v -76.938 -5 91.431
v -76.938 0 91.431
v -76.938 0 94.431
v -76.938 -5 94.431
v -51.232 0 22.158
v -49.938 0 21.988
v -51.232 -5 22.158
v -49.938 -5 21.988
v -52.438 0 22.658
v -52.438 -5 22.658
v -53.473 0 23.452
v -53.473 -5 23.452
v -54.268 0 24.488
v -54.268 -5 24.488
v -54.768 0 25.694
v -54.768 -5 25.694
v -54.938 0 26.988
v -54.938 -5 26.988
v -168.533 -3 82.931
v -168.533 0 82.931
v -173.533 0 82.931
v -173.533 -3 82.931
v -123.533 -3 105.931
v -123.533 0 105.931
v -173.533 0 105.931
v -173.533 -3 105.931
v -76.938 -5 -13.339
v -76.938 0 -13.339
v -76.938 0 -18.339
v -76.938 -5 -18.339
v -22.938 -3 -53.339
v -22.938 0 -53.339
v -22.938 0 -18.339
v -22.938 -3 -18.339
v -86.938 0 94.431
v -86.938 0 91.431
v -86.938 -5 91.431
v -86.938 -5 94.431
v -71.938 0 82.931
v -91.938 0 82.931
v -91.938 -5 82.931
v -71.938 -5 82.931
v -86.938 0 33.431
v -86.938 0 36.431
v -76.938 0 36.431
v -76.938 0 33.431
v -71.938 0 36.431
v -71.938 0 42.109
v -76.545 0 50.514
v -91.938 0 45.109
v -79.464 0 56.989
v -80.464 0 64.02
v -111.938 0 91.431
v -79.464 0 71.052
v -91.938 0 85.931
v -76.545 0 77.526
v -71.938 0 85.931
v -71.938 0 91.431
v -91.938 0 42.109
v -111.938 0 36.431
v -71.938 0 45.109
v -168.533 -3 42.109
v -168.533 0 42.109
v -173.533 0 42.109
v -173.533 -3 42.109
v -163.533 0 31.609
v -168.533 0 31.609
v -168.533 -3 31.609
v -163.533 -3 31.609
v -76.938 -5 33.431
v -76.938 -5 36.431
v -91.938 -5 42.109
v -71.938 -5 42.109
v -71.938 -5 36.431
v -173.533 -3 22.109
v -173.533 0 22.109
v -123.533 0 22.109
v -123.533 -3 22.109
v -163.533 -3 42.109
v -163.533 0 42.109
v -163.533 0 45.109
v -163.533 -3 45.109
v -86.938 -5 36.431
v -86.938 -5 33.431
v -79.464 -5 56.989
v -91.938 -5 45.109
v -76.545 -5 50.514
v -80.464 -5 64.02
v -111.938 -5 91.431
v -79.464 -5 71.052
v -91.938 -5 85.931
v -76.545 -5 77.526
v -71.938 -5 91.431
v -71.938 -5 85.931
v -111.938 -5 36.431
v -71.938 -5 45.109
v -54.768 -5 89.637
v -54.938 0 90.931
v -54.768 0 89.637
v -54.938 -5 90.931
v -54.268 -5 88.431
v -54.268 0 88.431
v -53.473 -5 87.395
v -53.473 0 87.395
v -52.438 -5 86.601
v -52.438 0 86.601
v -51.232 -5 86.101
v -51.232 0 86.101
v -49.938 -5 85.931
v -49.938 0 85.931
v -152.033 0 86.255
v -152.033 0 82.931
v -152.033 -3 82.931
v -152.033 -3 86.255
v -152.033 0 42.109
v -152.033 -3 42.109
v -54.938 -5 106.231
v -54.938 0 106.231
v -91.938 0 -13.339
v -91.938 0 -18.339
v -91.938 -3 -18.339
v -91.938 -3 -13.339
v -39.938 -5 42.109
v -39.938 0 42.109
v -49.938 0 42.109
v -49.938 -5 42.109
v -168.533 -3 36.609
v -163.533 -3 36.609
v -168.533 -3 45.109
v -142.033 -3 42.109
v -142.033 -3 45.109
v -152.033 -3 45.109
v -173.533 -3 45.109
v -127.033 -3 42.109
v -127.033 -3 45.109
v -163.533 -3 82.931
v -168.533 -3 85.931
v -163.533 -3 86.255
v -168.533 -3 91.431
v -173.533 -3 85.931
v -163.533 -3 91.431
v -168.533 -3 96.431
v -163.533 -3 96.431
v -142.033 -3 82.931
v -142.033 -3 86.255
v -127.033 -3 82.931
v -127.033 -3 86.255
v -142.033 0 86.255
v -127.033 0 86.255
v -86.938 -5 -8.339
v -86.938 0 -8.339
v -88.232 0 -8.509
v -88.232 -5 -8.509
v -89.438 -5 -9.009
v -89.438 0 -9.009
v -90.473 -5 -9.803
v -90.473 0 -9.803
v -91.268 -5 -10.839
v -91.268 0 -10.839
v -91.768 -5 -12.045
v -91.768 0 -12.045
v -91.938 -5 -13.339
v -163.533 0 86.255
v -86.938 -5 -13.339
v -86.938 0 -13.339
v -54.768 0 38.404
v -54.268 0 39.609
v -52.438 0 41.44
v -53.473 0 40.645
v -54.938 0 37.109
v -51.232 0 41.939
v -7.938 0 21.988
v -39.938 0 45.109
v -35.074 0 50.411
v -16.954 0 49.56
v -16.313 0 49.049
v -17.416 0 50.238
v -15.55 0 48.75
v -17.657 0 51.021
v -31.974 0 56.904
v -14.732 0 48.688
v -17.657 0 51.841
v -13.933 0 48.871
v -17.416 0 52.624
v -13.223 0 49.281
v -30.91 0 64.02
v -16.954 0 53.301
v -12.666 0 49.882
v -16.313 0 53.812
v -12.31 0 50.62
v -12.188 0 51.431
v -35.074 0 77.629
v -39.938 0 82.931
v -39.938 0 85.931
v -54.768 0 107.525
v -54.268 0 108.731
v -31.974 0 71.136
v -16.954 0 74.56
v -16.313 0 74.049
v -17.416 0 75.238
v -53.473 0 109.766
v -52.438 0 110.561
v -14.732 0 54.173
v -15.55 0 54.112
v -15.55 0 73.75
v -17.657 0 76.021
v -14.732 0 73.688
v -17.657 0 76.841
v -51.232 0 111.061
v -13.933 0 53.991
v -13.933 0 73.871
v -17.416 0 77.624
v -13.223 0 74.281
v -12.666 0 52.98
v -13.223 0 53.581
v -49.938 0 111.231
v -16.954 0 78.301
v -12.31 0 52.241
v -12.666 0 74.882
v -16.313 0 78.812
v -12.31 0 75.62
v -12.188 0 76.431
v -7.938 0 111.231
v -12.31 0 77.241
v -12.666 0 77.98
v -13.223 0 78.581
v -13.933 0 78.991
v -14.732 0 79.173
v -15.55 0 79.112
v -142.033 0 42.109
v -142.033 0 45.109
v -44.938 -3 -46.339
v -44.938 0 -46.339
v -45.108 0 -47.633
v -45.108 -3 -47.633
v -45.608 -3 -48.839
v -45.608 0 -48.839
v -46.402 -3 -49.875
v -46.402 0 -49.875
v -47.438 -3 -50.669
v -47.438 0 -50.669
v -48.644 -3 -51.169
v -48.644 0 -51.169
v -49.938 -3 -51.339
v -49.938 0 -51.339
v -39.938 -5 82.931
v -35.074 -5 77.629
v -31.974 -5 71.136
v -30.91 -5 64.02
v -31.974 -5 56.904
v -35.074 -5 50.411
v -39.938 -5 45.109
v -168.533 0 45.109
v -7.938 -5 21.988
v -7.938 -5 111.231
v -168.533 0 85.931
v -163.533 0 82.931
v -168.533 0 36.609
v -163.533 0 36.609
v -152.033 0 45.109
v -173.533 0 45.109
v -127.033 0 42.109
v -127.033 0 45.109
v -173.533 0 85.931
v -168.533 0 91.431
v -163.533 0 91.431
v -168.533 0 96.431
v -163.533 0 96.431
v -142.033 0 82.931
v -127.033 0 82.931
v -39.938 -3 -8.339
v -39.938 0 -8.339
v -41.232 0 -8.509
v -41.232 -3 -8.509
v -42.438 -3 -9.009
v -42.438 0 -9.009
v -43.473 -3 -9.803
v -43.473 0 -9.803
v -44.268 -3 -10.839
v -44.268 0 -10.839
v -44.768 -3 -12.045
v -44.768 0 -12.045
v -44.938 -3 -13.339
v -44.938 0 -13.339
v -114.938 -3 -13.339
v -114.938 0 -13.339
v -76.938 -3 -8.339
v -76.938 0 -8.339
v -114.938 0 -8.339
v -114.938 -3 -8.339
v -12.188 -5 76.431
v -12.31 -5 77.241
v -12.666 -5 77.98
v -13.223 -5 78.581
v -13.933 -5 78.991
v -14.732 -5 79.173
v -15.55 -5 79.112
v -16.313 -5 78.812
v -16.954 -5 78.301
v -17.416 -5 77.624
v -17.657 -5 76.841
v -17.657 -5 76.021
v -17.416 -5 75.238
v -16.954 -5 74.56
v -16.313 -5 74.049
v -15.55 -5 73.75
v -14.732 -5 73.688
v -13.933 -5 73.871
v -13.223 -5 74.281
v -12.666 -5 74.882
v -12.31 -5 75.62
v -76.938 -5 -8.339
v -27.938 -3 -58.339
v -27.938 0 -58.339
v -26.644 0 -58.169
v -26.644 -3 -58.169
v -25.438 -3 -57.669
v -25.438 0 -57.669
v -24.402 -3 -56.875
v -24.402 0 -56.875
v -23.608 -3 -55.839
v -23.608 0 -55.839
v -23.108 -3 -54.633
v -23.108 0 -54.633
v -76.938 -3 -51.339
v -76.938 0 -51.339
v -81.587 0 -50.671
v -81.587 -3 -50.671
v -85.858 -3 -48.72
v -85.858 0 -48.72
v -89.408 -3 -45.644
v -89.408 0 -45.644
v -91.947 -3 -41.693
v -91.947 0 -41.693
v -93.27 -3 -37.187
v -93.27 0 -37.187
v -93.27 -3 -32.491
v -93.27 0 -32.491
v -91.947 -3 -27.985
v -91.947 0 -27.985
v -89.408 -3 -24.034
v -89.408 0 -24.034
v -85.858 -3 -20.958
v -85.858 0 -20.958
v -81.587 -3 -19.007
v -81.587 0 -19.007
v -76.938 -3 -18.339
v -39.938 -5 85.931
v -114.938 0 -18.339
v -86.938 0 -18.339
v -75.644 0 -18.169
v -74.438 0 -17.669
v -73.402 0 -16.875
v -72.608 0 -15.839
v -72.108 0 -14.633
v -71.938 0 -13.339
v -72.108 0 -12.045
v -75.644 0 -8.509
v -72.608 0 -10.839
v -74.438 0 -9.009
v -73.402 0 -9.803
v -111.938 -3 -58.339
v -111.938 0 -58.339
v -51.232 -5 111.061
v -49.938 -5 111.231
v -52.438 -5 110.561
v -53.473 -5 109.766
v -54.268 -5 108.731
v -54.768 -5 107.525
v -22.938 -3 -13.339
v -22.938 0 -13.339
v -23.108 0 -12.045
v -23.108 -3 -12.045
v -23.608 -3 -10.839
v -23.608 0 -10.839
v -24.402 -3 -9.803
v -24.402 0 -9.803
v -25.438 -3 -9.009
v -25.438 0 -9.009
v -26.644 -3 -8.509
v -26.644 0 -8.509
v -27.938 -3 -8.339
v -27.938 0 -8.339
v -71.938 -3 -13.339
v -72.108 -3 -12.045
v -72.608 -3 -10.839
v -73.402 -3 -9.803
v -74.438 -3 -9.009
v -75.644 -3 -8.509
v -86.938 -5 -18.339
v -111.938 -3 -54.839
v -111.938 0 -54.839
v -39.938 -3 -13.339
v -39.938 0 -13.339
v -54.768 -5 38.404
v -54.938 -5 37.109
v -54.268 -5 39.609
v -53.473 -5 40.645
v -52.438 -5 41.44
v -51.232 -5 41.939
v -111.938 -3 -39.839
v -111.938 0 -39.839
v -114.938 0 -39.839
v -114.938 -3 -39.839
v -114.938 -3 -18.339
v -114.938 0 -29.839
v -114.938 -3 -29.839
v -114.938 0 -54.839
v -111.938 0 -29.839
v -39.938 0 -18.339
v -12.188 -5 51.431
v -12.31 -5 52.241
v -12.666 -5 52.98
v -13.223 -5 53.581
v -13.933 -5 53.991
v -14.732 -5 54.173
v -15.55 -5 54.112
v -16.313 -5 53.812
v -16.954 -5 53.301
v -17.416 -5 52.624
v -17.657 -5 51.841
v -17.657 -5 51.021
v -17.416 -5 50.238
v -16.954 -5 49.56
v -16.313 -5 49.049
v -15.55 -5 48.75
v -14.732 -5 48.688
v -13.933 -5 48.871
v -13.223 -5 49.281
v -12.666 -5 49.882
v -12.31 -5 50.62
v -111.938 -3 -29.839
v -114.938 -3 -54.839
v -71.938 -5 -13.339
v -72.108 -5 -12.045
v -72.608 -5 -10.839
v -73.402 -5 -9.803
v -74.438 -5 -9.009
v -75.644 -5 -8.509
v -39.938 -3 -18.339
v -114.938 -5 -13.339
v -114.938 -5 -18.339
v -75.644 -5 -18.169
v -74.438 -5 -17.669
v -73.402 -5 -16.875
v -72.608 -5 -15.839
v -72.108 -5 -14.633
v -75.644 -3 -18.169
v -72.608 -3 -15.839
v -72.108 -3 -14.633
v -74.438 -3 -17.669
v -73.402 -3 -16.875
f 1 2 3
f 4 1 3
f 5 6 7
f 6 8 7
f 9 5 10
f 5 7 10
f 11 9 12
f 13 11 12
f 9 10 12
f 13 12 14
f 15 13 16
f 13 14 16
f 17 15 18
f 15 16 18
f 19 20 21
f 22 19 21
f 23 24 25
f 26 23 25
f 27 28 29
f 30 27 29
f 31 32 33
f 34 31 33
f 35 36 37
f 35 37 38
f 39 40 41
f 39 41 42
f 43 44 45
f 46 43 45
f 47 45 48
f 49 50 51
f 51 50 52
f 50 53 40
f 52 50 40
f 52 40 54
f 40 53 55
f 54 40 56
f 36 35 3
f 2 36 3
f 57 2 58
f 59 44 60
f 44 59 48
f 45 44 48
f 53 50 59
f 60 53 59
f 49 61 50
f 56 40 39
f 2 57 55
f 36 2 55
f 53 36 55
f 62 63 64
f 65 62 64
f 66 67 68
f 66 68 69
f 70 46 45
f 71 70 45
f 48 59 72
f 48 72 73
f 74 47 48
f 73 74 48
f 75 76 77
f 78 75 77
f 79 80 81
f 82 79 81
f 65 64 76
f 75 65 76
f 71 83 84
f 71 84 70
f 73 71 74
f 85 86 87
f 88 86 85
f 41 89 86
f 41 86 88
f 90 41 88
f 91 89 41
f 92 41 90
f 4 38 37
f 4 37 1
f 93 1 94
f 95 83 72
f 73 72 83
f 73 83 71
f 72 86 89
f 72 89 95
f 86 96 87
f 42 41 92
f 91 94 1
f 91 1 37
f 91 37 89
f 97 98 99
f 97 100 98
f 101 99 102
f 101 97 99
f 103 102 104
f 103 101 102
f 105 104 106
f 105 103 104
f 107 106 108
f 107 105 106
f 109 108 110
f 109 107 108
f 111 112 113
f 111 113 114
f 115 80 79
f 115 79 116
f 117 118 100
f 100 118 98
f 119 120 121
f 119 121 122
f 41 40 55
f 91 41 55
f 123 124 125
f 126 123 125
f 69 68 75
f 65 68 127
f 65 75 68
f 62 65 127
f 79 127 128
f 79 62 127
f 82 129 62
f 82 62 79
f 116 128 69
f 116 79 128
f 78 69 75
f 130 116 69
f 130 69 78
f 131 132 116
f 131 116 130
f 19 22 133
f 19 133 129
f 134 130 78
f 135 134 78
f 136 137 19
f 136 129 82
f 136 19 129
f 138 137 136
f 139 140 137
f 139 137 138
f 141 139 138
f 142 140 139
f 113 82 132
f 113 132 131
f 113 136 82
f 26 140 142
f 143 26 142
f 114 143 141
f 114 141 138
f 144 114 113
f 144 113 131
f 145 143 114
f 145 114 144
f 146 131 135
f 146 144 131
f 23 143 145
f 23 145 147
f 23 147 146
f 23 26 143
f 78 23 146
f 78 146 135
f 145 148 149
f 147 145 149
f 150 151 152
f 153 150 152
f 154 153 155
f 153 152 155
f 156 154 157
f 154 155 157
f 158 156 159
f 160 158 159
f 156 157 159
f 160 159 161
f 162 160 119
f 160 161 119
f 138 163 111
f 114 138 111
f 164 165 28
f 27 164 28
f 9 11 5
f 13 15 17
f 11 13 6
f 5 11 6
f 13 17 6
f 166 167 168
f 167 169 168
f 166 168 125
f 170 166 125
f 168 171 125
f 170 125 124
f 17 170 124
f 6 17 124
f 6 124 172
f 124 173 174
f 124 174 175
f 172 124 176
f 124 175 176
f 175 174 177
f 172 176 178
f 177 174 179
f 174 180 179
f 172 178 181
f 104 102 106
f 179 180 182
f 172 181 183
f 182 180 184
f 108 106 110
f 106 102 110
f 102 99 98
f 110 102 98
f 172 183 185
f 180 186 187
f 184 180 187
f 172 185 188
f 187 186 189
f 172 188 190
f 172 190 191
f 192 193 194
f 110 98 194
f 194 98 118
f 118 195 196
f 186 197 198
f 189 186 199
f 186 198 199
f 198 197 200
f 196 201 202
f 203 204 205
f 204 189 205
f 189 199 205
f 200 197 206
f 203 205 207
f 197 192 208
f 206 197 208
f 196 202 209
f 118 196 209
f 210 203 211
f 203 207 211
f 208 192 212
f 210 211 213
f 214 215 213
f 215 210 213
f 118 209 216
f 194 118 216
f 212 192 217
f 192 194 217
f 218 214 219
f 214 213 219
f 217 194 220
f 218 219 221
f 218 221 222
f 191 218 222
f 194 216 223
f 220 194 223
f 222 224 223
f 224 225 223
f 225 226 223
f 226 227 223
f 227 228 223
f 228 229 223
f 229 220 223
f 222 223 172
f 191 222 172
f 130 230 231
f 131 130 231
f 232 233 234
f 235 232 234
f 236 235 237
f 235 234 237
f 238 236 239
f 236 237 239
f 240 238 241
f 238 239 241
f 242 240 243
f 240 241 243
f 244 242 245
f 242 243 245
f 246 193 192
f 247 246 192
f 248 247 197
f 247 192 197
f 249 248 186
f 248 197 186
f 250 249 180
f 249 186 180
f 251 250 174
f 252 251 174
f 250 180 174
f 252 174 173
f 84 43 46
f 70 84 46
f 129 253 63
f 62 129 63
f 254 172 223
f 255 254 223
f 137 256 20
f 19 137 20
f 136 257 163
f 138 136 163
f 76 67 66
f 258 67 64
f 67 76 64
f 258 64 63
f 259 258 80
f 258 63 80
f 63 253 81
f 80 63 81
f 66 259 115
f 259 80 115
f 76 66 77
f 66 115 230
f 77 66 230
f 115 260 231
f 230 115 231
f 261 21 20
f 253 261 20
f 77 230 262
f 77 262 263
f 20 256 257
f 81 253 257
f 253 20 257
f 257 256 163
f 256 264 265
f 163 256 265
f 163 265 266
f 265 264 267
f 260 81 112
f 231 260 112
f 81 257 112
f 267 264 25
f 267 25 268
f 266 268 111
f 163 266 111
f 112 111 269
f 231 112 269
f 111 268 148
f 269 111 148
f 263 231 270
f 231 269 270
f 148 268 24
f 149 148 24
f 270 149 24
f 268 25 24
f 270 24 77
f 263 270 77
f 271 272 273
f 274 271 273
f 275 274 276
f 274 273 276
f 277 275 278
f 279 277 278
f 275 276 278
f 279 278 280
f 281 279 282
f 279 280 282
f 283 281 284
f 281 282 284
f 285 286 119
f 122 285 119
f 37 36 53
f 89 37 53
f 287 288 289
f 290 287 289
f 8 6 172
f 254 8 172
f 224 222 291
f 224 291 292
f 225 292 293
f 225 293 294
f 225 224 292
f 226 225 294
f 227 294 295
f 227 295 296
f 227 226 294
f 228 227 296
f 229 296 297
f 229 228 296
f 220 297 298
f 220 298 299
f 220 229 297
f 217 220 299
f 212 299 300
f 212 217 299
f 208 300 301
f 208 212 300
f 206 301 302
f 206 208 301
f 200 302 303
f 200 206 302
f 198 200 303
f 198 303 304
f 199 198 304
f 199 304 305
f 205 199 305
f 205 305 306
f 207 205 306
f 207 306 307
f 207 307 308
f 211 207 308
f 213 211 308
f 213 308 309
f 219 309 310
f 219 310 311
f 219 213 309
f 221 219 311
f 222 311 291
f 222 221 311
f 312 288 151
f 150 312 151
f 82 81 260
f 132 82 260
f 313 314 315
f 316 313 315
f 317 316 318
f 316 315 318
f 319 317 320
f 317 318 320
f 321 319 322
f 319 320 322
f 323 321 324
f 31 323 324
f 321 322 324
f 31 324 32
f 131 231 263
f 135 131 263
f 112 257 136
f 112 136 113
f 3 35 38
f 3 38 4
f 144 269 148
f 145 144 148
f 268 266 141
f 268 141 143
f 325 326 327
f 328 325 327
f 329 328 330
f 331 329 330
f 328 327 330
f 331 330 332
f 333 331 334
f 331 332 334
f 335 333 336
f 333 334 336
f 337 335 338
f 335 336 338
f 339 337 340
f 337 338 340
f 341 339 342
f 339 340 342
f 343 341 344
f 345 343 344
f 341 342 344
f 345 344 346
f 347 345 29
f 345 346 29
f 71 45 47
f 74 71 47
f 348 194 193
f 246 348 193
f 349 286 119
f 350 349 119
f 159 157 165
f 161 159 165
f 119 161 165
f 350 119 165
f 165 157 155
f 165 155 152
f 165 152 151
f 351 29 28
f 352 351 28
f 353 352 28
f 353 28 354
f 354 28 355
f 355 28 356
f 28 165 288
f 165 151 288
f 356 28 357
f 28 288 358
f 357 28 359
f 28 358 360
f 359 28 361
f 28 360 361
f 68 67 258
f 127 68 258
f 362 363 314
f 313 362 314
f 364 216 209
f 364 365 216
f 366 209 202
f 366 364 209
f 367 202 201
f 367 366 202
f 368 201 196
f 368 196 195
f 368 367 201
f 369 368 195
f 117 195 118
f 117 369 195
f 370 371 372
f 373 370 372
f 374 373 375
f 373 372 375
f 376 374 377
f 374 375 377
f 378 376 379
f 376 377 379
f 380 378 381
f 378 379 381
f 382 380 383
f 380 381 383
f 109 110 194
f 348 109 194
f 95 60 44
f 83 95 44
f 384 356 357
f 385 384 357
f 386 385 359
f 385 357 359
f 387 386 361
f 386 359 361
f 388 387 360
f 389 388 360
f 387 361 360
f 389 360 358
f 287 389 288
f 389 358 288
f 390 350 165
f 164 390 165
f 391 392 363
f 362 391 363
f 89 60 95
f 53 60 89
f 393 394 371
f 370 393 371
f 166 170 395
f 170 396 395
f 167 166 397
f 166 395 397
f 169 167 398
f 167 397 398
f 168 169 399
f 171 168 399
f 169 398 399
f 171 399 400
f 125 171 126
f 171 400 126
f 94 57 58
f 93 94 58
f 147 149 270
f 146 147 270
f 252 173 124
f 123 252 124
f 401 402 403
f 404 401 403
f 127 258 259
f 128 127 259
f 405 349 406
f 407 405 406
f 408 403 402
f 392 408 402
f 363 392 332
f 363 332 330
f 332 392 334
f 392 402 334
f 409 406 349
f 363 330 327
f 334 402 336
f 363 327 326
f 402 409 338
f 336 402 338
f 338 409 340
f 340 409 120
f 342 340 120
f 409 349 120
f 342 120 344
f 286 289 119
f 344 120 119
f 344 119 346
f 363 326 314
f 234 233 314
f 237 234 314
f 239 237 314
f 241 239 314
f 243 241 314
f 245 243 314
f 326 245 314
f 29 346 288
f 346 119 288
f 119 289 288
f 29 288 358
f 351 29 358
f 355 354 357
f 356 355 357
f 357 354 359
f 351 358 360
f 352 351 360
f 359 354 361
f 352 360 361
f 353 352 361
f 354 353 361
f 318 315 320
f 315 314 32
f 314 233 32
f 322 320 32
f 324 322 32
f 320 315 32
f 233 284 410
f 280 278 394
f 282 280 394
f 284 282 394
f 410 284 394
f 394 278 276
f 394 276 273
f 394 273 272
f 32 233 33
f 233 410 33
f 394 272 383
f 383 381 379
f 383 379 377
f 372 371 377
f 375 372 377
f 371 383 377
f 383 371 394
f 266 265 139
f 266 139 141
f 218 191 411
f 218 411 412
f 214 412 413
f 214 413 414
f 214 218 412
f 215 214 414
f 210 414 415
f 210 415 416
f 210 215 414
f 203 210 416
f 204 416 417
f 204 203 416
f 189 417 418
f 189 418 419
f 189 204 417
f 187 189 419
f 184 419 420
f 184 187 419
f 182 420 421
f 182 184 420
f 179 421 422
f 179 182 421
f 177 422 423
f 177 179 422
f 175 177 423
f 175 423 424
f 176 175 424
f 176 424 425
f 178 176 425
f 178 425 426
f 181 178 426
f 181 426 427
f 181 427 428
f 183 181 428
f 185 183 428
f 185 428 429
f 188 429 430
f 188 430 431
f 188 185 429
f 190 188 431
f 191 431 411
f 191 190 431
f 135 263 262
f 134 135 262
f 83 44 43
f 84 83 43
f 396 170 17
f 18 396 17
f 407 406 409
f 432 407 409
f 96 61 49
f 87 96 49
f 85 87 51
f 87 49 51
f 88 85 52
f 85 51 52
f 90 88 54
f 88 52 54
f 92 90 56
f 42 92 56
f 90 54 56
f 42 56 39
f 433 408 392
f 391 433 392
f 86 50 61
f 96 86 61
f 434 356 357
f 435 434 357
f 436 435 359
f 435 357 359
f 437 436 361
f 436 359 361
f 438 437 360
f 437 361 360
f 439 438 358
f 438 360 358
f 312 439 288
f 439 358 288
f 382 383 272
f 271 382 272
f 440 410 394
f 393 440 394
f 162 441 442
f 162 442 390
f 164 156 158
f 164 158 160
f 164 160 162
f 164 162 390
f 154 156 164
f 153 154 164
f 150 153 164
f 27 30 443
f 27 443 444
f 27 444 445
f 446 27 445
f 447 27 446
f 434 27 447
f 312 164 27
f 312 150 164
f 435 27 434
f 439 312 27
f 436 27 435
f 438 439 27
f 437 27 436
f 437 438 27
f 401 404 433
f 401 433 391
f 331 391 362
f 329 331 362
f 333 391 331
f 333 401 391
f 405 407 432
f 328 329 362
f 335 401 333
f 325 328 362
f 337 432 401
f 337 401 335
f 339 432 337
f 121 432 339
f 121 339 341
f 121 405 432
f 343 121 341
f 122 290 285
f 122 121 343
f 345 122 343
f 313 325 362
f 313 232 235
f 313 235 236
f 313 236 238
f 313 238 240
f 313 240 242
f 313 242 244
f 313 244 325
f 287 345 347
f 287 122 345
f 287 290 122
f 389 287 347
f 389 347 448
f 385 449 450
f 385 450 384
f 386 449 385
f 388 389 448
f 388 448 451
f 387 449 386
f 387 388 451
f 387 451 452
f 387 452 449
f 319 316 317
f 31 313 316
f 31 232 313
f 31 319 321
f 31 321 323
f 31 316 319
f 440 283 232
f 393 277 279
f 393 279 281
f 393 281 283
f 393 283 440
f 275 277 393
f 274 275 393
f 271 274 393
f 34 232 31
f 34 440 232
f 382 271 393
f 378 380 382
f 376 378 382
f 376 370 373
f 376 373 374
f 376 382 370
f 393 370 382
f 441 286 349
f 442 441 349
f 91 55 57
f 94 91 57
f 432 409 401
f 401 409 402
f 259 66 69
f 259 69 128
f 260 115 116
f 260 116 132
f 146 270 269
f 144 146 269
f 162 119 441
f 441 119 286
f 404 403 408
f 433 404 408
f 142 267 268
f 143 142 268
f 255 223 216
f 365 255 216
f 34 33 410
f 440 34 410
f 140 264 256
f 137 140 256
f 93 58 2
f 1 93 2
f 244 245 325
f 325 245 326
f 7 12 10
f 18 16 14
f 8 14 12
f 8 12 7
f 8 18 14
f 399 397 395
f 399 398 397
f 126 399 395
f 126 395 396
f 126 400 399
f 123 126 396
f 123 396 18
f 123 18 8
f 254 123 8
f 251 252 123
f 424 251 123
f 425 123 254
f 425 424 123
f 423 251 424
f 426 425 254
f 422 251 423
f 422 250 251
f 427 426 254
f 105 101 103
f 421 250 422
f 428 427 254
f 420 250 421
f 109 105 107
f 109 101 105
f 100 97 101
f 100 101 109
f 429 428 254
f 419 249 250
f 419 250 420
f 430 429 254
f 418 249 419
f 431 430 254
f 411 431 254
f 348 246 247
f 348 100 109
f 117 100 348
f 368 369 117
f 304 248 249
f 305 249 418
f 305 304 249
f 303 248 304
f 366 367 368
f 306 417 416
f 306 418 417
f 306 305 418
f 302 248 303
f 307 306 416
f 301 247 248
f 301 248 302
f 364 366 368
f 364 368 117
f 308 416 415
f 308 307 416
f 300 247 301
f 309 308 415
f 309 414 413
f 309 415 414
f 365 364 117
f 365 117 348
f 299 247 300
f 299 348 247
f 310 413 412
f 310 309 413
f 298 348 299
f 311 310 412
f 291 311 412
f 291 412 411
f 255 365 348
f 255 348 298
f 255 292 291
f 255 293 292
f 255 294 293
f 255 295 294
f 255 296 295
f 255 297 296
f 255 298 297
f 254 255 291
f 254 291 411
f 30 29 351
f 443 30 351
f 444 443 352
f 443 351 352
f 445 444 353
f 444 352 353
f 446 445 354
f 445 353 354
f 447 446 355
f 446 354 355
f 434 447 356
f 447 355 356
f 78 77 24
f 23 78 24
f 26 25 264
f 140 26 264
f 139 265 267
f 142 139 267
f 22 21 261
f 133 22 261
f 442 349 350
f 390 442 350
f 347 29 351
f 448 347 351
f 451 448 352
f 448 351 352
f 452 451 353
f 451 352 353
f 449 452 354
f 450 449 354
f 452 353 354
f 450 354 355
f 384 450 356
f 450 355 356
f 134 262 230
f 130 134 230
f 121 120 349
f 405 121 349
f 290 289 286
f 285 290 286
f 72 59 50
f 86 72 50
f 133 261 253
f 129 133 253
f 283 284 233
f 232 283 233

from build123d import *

# Parameters (mm, degrees)
F0_W     = 10
F0_H     = 5
F0_W_2   = 5
F1_DEPTH = 3
F0_W_3   = 11.5
F0_H_2   = 3
F0_H_3   = 3.3244964182
F2_DEPTH = 3
F0_R     = 2.75
F0_W_4   = 17
F0_H_4   = 5.5
F0_H_5   = 5.6787184179
F3_DEPTH = 5
F4_DEPTH = 5
F5_DEPTH = 5
F0_W_5   = 20
F6_DEPTH = 5
F7_DEPTH = 5
F8_R     = 5


with BuildPart() as f1:
    # F0 (on Front) → F1 (new body)
    with BuildSketch(Plane.XZ):
        with BuildLine():
            Line((-76.9379170388, -8.3389794454), (-86.9379170388, -8.3389794454))
            ThreePointArc((-86.9379170388, -8.3389794454), (-90.4734509447, -9.8034455395), (-91.9379170388, -13.3389794454))
            Line((-91.9379170388, -13.3389794454), (-86.9379170388, -13.3389794454))
            Line((-86.9379170388, -13.3389794454), (-76.9379170388, -13.3389794454))
            Line((-76.9379170388, -13.3389794454), (-71.9379170388, -13.3389794454))
            ThreePointArc((-71.9379170388, -13.3389794454), (-73.4023831329, -9.8034455395), (-76.9379170388, -8.3389794454))
        make_face()
        with BuildLine():
            ThreePointArc((-91.9379170388, -13.3389794454), (-90.4734509447, -9.8034455395), (-86.9379170388, -8.3389794454))
            Line((-86.9379170388, -8.3389794454), (-114.9379170388, -8.3389794454))
            Line((-114.9379170388, -8.3389794454), (-114.9379170388, -13.3389794454))
            Line((-114.9379170388, -13.3389794454), (-91.9379170388, -13.3389794454))
        make_face()
        with Locations((-81.9379170388, -15.8389794454)):
            Rectangle(F0_W, F0_H)
        with BuildLine():
            Line((-86.9379170388, -18.3389794454), (-91.9379170388, -18.3389794454))
            Line((-91.9379170388, -18.3389794454), (-111.9379170388, -18.3389794454))
            Line((-111.9379170388, -18.3389794454), (-114.9379170388, -18.3389794454))
            Line((-114.9379170388, -18.3389794454), (-114.9379170388, -29.8389794454))
            Line((-114.9379170388, -29.8389794454), (-111.9379170388, -29.8389794454))
            Line((-111.9379170388, -29.8389794454), (-111.9379170388, -34.8389794454))
            Line((-111.9379170388, -34.8389794454), (-111.9379170388, -39.8389794454))
            Line((-111.9379170388, -39.8389794454), (-114.9379170388, -39.8389794454))
            Line((-114.9379170388, -39.8389794454), (-114.9379170388, -54.8389794454))
            Line((-114.9379170388, -54.8389794454), (-111.9379170388, -54.8389794454))
            Line((-111.9379170388, -54.8389794454), (-111.9379170388, -58.3389794454))
            Line((-111.9379170388, -58.3389794454), (-27.9379170388, -58.3389794454))
            ThreePointArc((-27.9379170388, -58.3389794454), (-24.4023831329, -56.8745133513), (-22.9379170388, -53.3389794454))
            Line((-22.9379170388, -53.3389794454), (-22.9379170388, -18.3389794454))
            Line((-22.9379170388, -18.3389794454), (-39.9379170388, -18.3389794454))
            Line((-39.9379170388, -18.3389794454), (-39.9379170388, -13.3389794454))
            Line((-39.9379170388, -13.3389794454), (-22.9379170388, -13.3389794454))
            ThreePointArc((-22.9379170388, -13.3389794454), (-24.4023831329, -9.8034455395), (-27.9379170388, -8.3389794454))
            Line((-27.9379170388, -8.3389794454), (-39.9379170388, -8.3389794454))
            ThreePointArc((-39.9379170388, -8.3389794454), (-43.4734509447, -9.8034455395), (-44.9379170388, -13.3389794454))
            Line((-44.9379170388, -13.3389794454), (-44.9379170388, -46.3389794454))
            ThreePointArc((-44.9379170388, -46.3389794454), (-46.4023831329, -49.8745133513), (-49.9379170388, -51.3389794454))
            Line((-49.9379170388, -51.3389794454), (-66.9379170388, -51.3389794454))
            Line((-66.9379170388, -51.3389794454), (-76.9379170388, -51.3389794454))
            ThreePointArc((-76.9379170388, -51.3389794454), (-93.4379170388, -34.8389794454), (-76.9379170388, -18.3389794454))
            Line((-76.9379170388, -18.3389794454), (-86.9379170388, -18.3389794454))
        make_face()
        with BuildLine():
            ThreePointArc((-76.9379170388, -18.3389794454), (-73.4023831329, -16.8745133513), (-71.9379170388, -13.3389794454))
            Line((-71.9379170388, -13.3389794454), (-76.9379170388, -13.3389794454))
            Line((-76.9379170388, -13.3389794454), (-76.9379170388, -18.3389794454))
        make_face()
        with Locations((-89.4379170388, -15.8389794454)):
            Rectangle(F0_W_2, F0_H)
    extrude(amount=F1_DEPTH)


with BuildPart() as f2:
    # F0 (on Front) → F2 (new body)
    with BuildSketch(Plane.XZ):
        Polygon((-123.5326989889, 42.1094321907), (-123.5326989889, 105.9307137728), (-172.0326989889, 105.9307137728), (-173.5326989889, 105.9307137728), (-173.5326989889, 85.9307137728), (-172.0326989889, 85.9307137728), (-168.5326989889, 85.9307137728), (-168.5326989889, 82.9307137728), (-172.0326989889, 82.9307137728), (-173.5326989889, 82.9307137728), (-173.5326989889, 45.1094321907), (-172.0326989889, 45.1094321907), (-168.5326989889, 45.1094321907), (-168.5326989889, 42.1094321907), (-172.0326989889, 42.1094321907), (-173.5326989889, 42.1094321907), (-173.5326989889, 22.1094321907), (-172.0326989889, 22.1094321907), (-125.9478926659, 22.1094321907), (-123.5326989889, 22.1094321907), align=None)
        with Locations((-166.0326989889, 34.1094321907)):
            Rectangle(F0_W_2, F0_H, mode=Mode.SUBTRACT)
        with Locations((-157.7826989889, 43.6094321907)):
            Rectangle(F0_W_3, F0_H_2, mode=Mode.SUBTRACT)
        Polygon((-127.0326989889, 42.1094321907), (-142.0326989889, 42.1094321907), (-142.0326989889, 45.1094321907), (-130.5326989889, 45.1094321907), (-127.0326989889, 45.1094321907), align=None, mode=Mode.SUBTRACT)
        with Locations((-157.7826989889, 84.5929619819)):
            Rectangle(F0_W_3, F0_H_3, mode=Mode.SUBTRACT)
        Polygon((-142.0326989889, 86.255210191), (-127.0326989889, 86.255210191), (-127.0326989889, 82.9307137728), (-130.5326989889, 82.9307137728), (-142.0326989889, 82.9307137728), align=None, mode=Mode.SUBTRACT)
        with Locations((-166.0326989889, 93.9307137728)):
            Rectangle(F0_W_2, F0_H, mode=Mode.SUBTRACT)
    extrude(amount=F2_DEPTH)


with BuildPart() as f3:
    # F0 (on Front) → F3 (new body)
    with BuildSketch(Plane.XZ):
        with BuildLine():
            Line((-7.9379170388, 31.4307137728), (-7.9379170388, 96.4307137728))
            Line((-7.9379170388, 96.4307137728), (-7.9379170388, 111.2309247255))
            Line((-7.9379170388, 111.2309247255), (-22.9379170388, 111.2309247255))
            Line((-22.9379170388, 111.2309247255), (-54.9379170388, 111.2309247255))
            Line((-54.9379170388, 111.2309247255), (-54.9379170388, 91.4307137728))
            Line((-54.9379170388, 91.4307137728), (-39.9379170388, 91.4307137728))
            Line((-39.9379170388, 91.4307137728), (-22.9379170388, 91.4307137728))
            Line((-22.9379170388, 91.4307137728), (-22.9379170388, 85.9307137728))
            Line((-22.9379170388, 85.9307137728), (-22.9379170388, 82.9307137728))
            Line((-22.9379170388, 82.9307137728), (-39.9379170388, 82.9307137728))
            ThreePointArc((-39.9379170388, 82.9307137728), (-30.9096430701, 64.0200729817), (-39.9379170388, 45.1094321907))
            Line((-39.9379170388, 45.1094321907), (-22.9379170388, 45.1094321907))
            Line((-22.9379170388, 45.1094321907), (-22.9379170388, 42.1094321907))
            Line((-22.9379170388, 42.1094321907), (-22.9379170388, 36.4307137728))
            Line((-22.9379170388, 36.4307137728), (-39.9379170388, 36.4307137728))
            Line((-39.9379170388, 36.4307137728), (-54.9379170388, 36.4307137728))
            Line((-54.9379170388, 36.4307137728), (-54.9379170388, 21.9877138734))
            Line((-54.9379170388, 21.9877138734), (-22.9379170388, 21.9877138734))
            Line((-22.9379170388, 21.9877138734), (-7.9379170388, 21.9877138734))
            Line((-7.9379170388, 21.9877138734), (-7.9379170388, 31.4307137728))
        make_face()
        with Locations((-14.9379170388, 51.4307137728)):
            Circle(F0_R, mode=Mode.SUBTRACT)
        with Locations((-14.9379170388, 76.4307137728)):
            Circle(F0_R, mode=Mode.SUBTRACT)
        with Locations((-31.4379170388, 84.4307137728)):
            Rectangle(F0_W_4, F0_H_2)
        with Locations((-31.4379170388, 88.6807137728)):
            Rectangle(F0_W_4, F0_H_4)
        Polygon((-39.9379170388, 91.4307137728), (-54.9379170388, 91.4307137728), (-54.9379170388, 85.9307137728), (-44.9379170388, 85.9307137728), (-39.9379170388, 85.9307137728), align=None)
        with Locations((-31.4379170388, 43.6094321907)):
            Rectangle(F0_W_4, F0_H_2)
        with Locations((-31.4379170388, 39.2700729817)):
            Rectangle(F0_W_4, F0_H_5)
        Polygon((-54.9379170388, 42.1094321907), (-54.9379170388, 36.4307137728), (-39.9379170388, 36.4307137728), (-39.9379170388, 42.1094321907), (-44.9379170388, 42.1094321907), align=None)
    extrude(amount=F3_DEPTH)

    # F8
    f8_edges = [f3.edges().sort_by_distance(p)[0] for p in [
        (-54.937917, -2.5, 42.109432),
        (-54.937917, -2.5, 85.930714),
        (-54.937917, -2.5, 21.987714),
        (-54.937917, -2.5, 111.230925),
    ]]
    fillet(f8_edges, radius=F8_R)


with BuildPart() as f4:
    # F0 (on Front) → F4 (new body)
    with BuildSketch(Plane.XZ):
        Polygon((-86.9379170388, 85.9307137728), (-71.9379170388, 85.9307137728), (-71.9379170388, 91.4307137728), (-76.9379170388, 91.4307137728), (-86.9379170388, 91.4307137728), (-91.9379170388, 91.4307137728), (-111.9379170388, 91.4307137728), (-111.9379170388, 85.9307137728), (-91.9379170388, 85.9307137728), align=None)
        Polygon((-71.9379170388, 36.4307137728), (-71.9379170388, 42.1094321907), (-86.9379170388, 42.1094321907), (-91.9379170388, 42.1094321907), (-111.9379170388, 42.1094321907), (-111.9379170388, 36.4307137728), (-86.9379170388, 36.4307137728), (-76.9379170388, 36.4307137728), align=None)
        with Locations((-89.4379170388, 84.4307137728)):
            Rectangle(F0_W_2, F0_H_2)
        with BuildLine():
            ThreePointArc((-71.9379170388, 45.1094321907), (-80.4638719585, 64.0200729817), (-71.9379170388, 82.9307137728))
            Line((-71.9379170388, 82.9307137728), (-86.9379170388, 82.9307137728))
            Line((-86.9379170388, 82.9307137728), (-91.9379170388, 82.9307137728))
            Line((-91.9379170388, 82.9307137728), (-111.9379170388, 82.9307137728))
            Line((-111.9379170388, 82.9307137728), (-111.9379170388, 80.9307137728))
            Line((-111.9379170388, 80.9307137728), (-111.9379170388, 45.1094321907))
            Line((-111.9379170388, 45.1094321907), (-91.9379170388, 45.1094321907))
            Line((-91.9379170388, 45.1094321907), (-86.9379170388, 45.1094321907))
            Line((-86.9379170388, 45.1094321907), (-71.9379170388, 45.1094321907))
        make_face()
        with Locations((-89.4379170388, 43.6094321907)):
            Rectangle(F0_W_2, F0_H_2)
    extrude(amount=F4_DEPTH)

    # F0 (on Front) → F6 (join)
    with BuildSketch(Plane.XZ):
        Polygon((-76.9379170388, 33.4307137728), (-76.9379170388, 36.4307137728), (-86.9379170388, 36.4307137728), (-86.9379170388, 33.4307137728), (-78.4176960588, 33.4307137728), align=None)
        with Locations((-81.9379170388, 92.9307137728)):
            Rectangle(F0_W, F0_H_2)
        with Locations((-101.9379170388, 84.4307137728)):
            Rectangle(F0_W_5, F0_H_2)
        with Locations((-101.9379170388, 43.6094321907)):
            Rectangle(F0_W_5, F0_H_2)
        with Locations((-89.4379170388, 84.4307137728)):
            Rectangle(F0_W_2, F0_H_2)
        with Locations((-89.4379170388, 43.6094321907)):
            Rectangle(F0_W_2, F0_H_2)
    extrude(amount=F6_DEPTH)

    # F0 (on Front) → F7 (cut)
    with BuildSketch(Plane.XZ):
        with Locations((-89.4379170388, 84.4307137728)):
            Rectangle(F0_W_2, F0_H_2)
        with Locations((-89.4379170388, 43.6094321907)):
            Rectangle(F0_W_2, F0_H_2)
    extrude(amount=F7_DEPTH, mode=Mode.SUBTRACT)


with BuildPart() as f4b:
    # F0 (on Front) → F4, piece 2 (new body)
    with BuildSketch(Plane.XZ):
        with BuildLine():
            Line((-76.9379170388, -8.3389794454), (-86.9379170388, -8.3389794454))
            ThreePointArc((-86.9379170388, -8.3389794454), (-90.4734509447, -9.8034455395), (-91.9379170388, -13.3389794454))
            Line((-91.9379170388, -13.3389794454), (-86.9379170388, -13.3389794454))
            Line((-86.9379170388, -13.3389794454), (-76.9379170388, -13.3389794454))
            Line((-76.9379170388, -13.3389794454), (-71.9379170388, -13.3389794454))
            ThreePointArc((-71.9379170388, -13.3389794454), (-73.4023831329, -9.8034455395), (-76.9379170388, -8.3389794454))
        make_face()
    extrude(amount=F4_DEPTH)

    # F0 (on Front) → F4, piece 3 (join)
    with BuildSketch(Plane.XZ):
        Polygon((-91.9379170388, -18.3389794454), (-91.9379170388, -13.3389794454), (-114.9379170388, -13.3389794454), (-114.9379170388, -18.3389794454), (-111.9379170388, -18.3389794454), align=None)
    extrude(amount=F4_DEPTH)

    # F0 (on Front) → F5 (join)
    with BuildSketch(Plane.XZ):
        Polygon((-91.9379170388, -18.3389794454), (-91.9379170388, -13.3389794454), (-114.9379170388, -13.3389794454), (-114.9379170388, -18.3389794454), (-111.9379170388, -18.3389794454), align=None)
        with Locations((-89.4379170388, -15.8389794454)):
            Rectangle(F0_W_2, F0_H)
        with BuildLine():
            Line((-76.9379170388, -8.3389794454), (-86.9379170388, -8.3389794454))
            ThreePointArc((-86.9379170388, -8.3389794454), (-90.4734509447, -9.8034455395), (-91.9379170388, -13.3389794454))
            Line((-91.9379170388, -13.3389794454), (-86.9379170388, -13.3389794454))
            Line((-86.9379170388, -13.3389794454), (-76.9379170388, -13.3389794454))
            Line((-76.9379170388, -13.3389794454), (-71.9379170388, -13.3389794454))
            ThreePointArc((-71.9379170388, -13.3389794454), (-73.4023831329, -9.8034455395), (-76.9379170388, -8.3389794454))
        make_face()
        with BuildLine():
            ThreePointArc((-76.9379170388, -18.3389794454), (-73.4023831329, -16.8745133513), (-71.9379170388, -13.3389794454))
            Line((-71.9379170388, -13.3389794454), (-76.9379170388, -13.3389794454))
            Line((-76.9379170388, -13.3389794454), (-76.9379170388, -18.3389794454))
        make_face()
    extrude(amount=F5_DEPTH)


solid = Compound([f1.part, f2.part, f3.part, f4.part, f4b.part])
